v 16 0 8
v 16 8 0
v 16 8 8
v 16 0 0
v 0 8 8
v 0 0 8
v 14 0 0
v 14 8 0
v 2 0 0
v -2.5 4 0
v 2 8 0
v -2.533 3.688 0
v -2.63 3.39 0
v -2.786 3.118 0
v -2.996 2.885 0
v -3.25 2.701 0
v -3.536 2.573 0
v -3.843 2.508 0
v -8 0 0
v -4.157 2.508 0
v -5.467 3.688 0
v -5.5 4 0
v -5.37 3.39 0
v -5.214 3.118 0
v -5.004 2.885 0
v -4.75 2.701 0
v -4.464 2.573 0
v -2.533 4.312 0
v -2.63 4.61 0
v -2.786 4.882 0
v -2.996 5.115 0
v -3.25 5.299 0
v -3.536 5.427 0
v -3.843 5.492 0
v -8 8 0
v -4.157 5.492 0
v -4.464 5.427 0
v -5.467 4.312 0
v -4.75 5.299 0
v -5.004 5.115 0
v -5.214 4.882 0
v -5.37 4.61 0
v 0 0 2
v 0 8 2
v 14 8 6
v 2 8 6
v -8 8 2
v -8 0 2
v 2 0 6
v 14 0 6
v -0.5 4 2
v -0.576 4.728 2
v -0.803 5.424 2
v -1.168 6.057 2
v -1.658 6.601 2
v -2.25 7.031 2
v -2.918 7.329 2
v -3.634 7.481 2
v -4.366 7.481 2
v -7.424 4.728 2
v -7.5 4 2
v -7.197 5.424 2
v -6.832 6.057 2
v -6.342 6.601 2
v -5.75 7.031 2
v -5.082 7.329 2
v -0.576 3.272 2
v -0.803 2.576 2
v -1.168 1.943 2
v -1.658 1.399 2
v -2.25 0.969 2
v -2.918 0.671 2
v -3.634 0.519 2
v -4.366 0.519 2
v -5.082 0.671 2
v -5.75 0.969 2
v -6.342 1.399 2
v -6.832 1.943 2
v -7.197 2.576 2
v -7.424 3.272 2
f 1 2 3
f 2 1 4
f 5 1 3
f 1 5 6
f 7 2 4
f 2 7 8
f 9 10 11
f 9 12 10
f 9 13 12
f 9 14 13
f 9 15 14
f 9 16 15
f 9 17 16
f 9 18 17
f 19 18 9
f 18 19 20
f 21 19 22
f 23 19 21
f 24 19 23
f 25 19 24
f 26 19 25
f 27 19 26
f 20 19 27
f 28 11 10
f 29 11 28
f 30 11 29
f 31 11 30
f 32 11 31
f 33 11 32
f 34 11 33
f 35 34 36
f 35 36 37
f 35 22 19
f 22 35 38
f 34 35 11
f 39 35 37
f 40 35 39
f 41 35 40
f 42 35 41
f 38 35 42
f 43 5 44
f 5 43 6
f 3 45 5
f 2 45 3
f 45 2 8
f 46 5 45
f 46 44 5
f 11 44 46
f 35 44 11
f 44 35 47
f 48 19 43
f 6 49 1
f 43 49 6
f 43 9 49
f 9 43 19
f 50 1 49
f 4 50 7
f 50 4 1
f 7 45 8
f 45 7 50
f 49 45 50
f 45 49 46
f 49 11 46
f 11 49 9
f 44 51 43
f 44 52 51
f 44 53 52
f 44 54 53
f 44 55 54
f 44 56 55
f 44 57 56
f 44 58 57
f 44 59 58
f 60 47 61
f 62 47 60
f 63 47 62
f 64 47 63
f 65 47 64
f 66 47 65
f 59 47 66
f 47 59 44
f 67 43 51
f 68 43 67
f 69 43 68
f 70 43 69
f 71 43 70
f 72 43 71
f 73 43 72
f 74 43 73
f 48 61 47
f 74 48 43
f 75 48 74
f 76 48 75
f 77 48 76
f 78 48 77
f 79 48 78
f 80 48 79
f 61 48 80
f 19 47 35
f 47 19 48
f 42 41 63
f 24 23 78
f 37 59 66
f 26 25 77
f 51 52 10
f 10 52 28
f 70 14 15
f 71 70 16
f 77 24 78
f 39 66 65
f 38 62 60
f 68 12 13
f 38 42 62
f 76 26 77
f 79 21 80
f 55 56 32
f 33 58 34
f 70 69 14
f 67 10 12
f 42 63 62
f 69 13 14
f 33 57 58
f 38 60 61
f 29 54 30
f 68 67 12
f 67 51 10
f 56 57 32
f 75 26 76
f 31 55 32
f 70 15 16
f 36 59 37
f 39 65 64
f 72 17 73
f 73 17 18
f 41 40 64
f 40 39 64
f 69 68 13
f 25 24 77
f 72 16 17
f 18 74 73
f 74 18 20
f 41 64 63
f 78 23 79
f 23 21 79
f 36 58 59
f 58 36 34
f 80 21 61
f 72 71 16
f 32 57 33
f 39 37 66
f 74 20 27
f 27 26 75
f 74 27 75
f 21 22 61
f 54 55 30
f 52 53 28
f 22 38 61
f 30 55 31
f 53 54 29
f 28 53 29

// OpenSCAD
WALL_THICKNESS = 2;
LEDS_STRIP_THICKNESS = 6;
LED_STRIP_HEIGHT = 12;
SCREW_HEAD_DIAMETER = 7;
SCREW_DIAMETER = 3;

FIX_WIDTH = 8;

$fn = 30;

difference() {
    cube([LED_STRIP_HEIGHT + WALL_THICKNESS * 2, FIX_WIDTH, LEDS_STRIP_THICKNESS + WALL_THICKNESS]);
    translate([WALL_THICKNESS, 0, 0])  cube([LED_STRIP_HEIGHT, FIX_WIDTH, LEDS_STRIP_THICKNESS]);
    
}

translate([-FIX_WIDTH, 0, 0]) 
difference() {
    cube([FIX_WIDTH, FIX_WIDTH, WALL_THICKNESS]);
    translate ([FIX_WIDTH / 2, FIX_WIDTH / 2, 0]) cylinder(d1 = SCREW_DIAMETER, d2 = SCREW_HEAD_DIAMETER, h = WALL_THICKNESS);
}
